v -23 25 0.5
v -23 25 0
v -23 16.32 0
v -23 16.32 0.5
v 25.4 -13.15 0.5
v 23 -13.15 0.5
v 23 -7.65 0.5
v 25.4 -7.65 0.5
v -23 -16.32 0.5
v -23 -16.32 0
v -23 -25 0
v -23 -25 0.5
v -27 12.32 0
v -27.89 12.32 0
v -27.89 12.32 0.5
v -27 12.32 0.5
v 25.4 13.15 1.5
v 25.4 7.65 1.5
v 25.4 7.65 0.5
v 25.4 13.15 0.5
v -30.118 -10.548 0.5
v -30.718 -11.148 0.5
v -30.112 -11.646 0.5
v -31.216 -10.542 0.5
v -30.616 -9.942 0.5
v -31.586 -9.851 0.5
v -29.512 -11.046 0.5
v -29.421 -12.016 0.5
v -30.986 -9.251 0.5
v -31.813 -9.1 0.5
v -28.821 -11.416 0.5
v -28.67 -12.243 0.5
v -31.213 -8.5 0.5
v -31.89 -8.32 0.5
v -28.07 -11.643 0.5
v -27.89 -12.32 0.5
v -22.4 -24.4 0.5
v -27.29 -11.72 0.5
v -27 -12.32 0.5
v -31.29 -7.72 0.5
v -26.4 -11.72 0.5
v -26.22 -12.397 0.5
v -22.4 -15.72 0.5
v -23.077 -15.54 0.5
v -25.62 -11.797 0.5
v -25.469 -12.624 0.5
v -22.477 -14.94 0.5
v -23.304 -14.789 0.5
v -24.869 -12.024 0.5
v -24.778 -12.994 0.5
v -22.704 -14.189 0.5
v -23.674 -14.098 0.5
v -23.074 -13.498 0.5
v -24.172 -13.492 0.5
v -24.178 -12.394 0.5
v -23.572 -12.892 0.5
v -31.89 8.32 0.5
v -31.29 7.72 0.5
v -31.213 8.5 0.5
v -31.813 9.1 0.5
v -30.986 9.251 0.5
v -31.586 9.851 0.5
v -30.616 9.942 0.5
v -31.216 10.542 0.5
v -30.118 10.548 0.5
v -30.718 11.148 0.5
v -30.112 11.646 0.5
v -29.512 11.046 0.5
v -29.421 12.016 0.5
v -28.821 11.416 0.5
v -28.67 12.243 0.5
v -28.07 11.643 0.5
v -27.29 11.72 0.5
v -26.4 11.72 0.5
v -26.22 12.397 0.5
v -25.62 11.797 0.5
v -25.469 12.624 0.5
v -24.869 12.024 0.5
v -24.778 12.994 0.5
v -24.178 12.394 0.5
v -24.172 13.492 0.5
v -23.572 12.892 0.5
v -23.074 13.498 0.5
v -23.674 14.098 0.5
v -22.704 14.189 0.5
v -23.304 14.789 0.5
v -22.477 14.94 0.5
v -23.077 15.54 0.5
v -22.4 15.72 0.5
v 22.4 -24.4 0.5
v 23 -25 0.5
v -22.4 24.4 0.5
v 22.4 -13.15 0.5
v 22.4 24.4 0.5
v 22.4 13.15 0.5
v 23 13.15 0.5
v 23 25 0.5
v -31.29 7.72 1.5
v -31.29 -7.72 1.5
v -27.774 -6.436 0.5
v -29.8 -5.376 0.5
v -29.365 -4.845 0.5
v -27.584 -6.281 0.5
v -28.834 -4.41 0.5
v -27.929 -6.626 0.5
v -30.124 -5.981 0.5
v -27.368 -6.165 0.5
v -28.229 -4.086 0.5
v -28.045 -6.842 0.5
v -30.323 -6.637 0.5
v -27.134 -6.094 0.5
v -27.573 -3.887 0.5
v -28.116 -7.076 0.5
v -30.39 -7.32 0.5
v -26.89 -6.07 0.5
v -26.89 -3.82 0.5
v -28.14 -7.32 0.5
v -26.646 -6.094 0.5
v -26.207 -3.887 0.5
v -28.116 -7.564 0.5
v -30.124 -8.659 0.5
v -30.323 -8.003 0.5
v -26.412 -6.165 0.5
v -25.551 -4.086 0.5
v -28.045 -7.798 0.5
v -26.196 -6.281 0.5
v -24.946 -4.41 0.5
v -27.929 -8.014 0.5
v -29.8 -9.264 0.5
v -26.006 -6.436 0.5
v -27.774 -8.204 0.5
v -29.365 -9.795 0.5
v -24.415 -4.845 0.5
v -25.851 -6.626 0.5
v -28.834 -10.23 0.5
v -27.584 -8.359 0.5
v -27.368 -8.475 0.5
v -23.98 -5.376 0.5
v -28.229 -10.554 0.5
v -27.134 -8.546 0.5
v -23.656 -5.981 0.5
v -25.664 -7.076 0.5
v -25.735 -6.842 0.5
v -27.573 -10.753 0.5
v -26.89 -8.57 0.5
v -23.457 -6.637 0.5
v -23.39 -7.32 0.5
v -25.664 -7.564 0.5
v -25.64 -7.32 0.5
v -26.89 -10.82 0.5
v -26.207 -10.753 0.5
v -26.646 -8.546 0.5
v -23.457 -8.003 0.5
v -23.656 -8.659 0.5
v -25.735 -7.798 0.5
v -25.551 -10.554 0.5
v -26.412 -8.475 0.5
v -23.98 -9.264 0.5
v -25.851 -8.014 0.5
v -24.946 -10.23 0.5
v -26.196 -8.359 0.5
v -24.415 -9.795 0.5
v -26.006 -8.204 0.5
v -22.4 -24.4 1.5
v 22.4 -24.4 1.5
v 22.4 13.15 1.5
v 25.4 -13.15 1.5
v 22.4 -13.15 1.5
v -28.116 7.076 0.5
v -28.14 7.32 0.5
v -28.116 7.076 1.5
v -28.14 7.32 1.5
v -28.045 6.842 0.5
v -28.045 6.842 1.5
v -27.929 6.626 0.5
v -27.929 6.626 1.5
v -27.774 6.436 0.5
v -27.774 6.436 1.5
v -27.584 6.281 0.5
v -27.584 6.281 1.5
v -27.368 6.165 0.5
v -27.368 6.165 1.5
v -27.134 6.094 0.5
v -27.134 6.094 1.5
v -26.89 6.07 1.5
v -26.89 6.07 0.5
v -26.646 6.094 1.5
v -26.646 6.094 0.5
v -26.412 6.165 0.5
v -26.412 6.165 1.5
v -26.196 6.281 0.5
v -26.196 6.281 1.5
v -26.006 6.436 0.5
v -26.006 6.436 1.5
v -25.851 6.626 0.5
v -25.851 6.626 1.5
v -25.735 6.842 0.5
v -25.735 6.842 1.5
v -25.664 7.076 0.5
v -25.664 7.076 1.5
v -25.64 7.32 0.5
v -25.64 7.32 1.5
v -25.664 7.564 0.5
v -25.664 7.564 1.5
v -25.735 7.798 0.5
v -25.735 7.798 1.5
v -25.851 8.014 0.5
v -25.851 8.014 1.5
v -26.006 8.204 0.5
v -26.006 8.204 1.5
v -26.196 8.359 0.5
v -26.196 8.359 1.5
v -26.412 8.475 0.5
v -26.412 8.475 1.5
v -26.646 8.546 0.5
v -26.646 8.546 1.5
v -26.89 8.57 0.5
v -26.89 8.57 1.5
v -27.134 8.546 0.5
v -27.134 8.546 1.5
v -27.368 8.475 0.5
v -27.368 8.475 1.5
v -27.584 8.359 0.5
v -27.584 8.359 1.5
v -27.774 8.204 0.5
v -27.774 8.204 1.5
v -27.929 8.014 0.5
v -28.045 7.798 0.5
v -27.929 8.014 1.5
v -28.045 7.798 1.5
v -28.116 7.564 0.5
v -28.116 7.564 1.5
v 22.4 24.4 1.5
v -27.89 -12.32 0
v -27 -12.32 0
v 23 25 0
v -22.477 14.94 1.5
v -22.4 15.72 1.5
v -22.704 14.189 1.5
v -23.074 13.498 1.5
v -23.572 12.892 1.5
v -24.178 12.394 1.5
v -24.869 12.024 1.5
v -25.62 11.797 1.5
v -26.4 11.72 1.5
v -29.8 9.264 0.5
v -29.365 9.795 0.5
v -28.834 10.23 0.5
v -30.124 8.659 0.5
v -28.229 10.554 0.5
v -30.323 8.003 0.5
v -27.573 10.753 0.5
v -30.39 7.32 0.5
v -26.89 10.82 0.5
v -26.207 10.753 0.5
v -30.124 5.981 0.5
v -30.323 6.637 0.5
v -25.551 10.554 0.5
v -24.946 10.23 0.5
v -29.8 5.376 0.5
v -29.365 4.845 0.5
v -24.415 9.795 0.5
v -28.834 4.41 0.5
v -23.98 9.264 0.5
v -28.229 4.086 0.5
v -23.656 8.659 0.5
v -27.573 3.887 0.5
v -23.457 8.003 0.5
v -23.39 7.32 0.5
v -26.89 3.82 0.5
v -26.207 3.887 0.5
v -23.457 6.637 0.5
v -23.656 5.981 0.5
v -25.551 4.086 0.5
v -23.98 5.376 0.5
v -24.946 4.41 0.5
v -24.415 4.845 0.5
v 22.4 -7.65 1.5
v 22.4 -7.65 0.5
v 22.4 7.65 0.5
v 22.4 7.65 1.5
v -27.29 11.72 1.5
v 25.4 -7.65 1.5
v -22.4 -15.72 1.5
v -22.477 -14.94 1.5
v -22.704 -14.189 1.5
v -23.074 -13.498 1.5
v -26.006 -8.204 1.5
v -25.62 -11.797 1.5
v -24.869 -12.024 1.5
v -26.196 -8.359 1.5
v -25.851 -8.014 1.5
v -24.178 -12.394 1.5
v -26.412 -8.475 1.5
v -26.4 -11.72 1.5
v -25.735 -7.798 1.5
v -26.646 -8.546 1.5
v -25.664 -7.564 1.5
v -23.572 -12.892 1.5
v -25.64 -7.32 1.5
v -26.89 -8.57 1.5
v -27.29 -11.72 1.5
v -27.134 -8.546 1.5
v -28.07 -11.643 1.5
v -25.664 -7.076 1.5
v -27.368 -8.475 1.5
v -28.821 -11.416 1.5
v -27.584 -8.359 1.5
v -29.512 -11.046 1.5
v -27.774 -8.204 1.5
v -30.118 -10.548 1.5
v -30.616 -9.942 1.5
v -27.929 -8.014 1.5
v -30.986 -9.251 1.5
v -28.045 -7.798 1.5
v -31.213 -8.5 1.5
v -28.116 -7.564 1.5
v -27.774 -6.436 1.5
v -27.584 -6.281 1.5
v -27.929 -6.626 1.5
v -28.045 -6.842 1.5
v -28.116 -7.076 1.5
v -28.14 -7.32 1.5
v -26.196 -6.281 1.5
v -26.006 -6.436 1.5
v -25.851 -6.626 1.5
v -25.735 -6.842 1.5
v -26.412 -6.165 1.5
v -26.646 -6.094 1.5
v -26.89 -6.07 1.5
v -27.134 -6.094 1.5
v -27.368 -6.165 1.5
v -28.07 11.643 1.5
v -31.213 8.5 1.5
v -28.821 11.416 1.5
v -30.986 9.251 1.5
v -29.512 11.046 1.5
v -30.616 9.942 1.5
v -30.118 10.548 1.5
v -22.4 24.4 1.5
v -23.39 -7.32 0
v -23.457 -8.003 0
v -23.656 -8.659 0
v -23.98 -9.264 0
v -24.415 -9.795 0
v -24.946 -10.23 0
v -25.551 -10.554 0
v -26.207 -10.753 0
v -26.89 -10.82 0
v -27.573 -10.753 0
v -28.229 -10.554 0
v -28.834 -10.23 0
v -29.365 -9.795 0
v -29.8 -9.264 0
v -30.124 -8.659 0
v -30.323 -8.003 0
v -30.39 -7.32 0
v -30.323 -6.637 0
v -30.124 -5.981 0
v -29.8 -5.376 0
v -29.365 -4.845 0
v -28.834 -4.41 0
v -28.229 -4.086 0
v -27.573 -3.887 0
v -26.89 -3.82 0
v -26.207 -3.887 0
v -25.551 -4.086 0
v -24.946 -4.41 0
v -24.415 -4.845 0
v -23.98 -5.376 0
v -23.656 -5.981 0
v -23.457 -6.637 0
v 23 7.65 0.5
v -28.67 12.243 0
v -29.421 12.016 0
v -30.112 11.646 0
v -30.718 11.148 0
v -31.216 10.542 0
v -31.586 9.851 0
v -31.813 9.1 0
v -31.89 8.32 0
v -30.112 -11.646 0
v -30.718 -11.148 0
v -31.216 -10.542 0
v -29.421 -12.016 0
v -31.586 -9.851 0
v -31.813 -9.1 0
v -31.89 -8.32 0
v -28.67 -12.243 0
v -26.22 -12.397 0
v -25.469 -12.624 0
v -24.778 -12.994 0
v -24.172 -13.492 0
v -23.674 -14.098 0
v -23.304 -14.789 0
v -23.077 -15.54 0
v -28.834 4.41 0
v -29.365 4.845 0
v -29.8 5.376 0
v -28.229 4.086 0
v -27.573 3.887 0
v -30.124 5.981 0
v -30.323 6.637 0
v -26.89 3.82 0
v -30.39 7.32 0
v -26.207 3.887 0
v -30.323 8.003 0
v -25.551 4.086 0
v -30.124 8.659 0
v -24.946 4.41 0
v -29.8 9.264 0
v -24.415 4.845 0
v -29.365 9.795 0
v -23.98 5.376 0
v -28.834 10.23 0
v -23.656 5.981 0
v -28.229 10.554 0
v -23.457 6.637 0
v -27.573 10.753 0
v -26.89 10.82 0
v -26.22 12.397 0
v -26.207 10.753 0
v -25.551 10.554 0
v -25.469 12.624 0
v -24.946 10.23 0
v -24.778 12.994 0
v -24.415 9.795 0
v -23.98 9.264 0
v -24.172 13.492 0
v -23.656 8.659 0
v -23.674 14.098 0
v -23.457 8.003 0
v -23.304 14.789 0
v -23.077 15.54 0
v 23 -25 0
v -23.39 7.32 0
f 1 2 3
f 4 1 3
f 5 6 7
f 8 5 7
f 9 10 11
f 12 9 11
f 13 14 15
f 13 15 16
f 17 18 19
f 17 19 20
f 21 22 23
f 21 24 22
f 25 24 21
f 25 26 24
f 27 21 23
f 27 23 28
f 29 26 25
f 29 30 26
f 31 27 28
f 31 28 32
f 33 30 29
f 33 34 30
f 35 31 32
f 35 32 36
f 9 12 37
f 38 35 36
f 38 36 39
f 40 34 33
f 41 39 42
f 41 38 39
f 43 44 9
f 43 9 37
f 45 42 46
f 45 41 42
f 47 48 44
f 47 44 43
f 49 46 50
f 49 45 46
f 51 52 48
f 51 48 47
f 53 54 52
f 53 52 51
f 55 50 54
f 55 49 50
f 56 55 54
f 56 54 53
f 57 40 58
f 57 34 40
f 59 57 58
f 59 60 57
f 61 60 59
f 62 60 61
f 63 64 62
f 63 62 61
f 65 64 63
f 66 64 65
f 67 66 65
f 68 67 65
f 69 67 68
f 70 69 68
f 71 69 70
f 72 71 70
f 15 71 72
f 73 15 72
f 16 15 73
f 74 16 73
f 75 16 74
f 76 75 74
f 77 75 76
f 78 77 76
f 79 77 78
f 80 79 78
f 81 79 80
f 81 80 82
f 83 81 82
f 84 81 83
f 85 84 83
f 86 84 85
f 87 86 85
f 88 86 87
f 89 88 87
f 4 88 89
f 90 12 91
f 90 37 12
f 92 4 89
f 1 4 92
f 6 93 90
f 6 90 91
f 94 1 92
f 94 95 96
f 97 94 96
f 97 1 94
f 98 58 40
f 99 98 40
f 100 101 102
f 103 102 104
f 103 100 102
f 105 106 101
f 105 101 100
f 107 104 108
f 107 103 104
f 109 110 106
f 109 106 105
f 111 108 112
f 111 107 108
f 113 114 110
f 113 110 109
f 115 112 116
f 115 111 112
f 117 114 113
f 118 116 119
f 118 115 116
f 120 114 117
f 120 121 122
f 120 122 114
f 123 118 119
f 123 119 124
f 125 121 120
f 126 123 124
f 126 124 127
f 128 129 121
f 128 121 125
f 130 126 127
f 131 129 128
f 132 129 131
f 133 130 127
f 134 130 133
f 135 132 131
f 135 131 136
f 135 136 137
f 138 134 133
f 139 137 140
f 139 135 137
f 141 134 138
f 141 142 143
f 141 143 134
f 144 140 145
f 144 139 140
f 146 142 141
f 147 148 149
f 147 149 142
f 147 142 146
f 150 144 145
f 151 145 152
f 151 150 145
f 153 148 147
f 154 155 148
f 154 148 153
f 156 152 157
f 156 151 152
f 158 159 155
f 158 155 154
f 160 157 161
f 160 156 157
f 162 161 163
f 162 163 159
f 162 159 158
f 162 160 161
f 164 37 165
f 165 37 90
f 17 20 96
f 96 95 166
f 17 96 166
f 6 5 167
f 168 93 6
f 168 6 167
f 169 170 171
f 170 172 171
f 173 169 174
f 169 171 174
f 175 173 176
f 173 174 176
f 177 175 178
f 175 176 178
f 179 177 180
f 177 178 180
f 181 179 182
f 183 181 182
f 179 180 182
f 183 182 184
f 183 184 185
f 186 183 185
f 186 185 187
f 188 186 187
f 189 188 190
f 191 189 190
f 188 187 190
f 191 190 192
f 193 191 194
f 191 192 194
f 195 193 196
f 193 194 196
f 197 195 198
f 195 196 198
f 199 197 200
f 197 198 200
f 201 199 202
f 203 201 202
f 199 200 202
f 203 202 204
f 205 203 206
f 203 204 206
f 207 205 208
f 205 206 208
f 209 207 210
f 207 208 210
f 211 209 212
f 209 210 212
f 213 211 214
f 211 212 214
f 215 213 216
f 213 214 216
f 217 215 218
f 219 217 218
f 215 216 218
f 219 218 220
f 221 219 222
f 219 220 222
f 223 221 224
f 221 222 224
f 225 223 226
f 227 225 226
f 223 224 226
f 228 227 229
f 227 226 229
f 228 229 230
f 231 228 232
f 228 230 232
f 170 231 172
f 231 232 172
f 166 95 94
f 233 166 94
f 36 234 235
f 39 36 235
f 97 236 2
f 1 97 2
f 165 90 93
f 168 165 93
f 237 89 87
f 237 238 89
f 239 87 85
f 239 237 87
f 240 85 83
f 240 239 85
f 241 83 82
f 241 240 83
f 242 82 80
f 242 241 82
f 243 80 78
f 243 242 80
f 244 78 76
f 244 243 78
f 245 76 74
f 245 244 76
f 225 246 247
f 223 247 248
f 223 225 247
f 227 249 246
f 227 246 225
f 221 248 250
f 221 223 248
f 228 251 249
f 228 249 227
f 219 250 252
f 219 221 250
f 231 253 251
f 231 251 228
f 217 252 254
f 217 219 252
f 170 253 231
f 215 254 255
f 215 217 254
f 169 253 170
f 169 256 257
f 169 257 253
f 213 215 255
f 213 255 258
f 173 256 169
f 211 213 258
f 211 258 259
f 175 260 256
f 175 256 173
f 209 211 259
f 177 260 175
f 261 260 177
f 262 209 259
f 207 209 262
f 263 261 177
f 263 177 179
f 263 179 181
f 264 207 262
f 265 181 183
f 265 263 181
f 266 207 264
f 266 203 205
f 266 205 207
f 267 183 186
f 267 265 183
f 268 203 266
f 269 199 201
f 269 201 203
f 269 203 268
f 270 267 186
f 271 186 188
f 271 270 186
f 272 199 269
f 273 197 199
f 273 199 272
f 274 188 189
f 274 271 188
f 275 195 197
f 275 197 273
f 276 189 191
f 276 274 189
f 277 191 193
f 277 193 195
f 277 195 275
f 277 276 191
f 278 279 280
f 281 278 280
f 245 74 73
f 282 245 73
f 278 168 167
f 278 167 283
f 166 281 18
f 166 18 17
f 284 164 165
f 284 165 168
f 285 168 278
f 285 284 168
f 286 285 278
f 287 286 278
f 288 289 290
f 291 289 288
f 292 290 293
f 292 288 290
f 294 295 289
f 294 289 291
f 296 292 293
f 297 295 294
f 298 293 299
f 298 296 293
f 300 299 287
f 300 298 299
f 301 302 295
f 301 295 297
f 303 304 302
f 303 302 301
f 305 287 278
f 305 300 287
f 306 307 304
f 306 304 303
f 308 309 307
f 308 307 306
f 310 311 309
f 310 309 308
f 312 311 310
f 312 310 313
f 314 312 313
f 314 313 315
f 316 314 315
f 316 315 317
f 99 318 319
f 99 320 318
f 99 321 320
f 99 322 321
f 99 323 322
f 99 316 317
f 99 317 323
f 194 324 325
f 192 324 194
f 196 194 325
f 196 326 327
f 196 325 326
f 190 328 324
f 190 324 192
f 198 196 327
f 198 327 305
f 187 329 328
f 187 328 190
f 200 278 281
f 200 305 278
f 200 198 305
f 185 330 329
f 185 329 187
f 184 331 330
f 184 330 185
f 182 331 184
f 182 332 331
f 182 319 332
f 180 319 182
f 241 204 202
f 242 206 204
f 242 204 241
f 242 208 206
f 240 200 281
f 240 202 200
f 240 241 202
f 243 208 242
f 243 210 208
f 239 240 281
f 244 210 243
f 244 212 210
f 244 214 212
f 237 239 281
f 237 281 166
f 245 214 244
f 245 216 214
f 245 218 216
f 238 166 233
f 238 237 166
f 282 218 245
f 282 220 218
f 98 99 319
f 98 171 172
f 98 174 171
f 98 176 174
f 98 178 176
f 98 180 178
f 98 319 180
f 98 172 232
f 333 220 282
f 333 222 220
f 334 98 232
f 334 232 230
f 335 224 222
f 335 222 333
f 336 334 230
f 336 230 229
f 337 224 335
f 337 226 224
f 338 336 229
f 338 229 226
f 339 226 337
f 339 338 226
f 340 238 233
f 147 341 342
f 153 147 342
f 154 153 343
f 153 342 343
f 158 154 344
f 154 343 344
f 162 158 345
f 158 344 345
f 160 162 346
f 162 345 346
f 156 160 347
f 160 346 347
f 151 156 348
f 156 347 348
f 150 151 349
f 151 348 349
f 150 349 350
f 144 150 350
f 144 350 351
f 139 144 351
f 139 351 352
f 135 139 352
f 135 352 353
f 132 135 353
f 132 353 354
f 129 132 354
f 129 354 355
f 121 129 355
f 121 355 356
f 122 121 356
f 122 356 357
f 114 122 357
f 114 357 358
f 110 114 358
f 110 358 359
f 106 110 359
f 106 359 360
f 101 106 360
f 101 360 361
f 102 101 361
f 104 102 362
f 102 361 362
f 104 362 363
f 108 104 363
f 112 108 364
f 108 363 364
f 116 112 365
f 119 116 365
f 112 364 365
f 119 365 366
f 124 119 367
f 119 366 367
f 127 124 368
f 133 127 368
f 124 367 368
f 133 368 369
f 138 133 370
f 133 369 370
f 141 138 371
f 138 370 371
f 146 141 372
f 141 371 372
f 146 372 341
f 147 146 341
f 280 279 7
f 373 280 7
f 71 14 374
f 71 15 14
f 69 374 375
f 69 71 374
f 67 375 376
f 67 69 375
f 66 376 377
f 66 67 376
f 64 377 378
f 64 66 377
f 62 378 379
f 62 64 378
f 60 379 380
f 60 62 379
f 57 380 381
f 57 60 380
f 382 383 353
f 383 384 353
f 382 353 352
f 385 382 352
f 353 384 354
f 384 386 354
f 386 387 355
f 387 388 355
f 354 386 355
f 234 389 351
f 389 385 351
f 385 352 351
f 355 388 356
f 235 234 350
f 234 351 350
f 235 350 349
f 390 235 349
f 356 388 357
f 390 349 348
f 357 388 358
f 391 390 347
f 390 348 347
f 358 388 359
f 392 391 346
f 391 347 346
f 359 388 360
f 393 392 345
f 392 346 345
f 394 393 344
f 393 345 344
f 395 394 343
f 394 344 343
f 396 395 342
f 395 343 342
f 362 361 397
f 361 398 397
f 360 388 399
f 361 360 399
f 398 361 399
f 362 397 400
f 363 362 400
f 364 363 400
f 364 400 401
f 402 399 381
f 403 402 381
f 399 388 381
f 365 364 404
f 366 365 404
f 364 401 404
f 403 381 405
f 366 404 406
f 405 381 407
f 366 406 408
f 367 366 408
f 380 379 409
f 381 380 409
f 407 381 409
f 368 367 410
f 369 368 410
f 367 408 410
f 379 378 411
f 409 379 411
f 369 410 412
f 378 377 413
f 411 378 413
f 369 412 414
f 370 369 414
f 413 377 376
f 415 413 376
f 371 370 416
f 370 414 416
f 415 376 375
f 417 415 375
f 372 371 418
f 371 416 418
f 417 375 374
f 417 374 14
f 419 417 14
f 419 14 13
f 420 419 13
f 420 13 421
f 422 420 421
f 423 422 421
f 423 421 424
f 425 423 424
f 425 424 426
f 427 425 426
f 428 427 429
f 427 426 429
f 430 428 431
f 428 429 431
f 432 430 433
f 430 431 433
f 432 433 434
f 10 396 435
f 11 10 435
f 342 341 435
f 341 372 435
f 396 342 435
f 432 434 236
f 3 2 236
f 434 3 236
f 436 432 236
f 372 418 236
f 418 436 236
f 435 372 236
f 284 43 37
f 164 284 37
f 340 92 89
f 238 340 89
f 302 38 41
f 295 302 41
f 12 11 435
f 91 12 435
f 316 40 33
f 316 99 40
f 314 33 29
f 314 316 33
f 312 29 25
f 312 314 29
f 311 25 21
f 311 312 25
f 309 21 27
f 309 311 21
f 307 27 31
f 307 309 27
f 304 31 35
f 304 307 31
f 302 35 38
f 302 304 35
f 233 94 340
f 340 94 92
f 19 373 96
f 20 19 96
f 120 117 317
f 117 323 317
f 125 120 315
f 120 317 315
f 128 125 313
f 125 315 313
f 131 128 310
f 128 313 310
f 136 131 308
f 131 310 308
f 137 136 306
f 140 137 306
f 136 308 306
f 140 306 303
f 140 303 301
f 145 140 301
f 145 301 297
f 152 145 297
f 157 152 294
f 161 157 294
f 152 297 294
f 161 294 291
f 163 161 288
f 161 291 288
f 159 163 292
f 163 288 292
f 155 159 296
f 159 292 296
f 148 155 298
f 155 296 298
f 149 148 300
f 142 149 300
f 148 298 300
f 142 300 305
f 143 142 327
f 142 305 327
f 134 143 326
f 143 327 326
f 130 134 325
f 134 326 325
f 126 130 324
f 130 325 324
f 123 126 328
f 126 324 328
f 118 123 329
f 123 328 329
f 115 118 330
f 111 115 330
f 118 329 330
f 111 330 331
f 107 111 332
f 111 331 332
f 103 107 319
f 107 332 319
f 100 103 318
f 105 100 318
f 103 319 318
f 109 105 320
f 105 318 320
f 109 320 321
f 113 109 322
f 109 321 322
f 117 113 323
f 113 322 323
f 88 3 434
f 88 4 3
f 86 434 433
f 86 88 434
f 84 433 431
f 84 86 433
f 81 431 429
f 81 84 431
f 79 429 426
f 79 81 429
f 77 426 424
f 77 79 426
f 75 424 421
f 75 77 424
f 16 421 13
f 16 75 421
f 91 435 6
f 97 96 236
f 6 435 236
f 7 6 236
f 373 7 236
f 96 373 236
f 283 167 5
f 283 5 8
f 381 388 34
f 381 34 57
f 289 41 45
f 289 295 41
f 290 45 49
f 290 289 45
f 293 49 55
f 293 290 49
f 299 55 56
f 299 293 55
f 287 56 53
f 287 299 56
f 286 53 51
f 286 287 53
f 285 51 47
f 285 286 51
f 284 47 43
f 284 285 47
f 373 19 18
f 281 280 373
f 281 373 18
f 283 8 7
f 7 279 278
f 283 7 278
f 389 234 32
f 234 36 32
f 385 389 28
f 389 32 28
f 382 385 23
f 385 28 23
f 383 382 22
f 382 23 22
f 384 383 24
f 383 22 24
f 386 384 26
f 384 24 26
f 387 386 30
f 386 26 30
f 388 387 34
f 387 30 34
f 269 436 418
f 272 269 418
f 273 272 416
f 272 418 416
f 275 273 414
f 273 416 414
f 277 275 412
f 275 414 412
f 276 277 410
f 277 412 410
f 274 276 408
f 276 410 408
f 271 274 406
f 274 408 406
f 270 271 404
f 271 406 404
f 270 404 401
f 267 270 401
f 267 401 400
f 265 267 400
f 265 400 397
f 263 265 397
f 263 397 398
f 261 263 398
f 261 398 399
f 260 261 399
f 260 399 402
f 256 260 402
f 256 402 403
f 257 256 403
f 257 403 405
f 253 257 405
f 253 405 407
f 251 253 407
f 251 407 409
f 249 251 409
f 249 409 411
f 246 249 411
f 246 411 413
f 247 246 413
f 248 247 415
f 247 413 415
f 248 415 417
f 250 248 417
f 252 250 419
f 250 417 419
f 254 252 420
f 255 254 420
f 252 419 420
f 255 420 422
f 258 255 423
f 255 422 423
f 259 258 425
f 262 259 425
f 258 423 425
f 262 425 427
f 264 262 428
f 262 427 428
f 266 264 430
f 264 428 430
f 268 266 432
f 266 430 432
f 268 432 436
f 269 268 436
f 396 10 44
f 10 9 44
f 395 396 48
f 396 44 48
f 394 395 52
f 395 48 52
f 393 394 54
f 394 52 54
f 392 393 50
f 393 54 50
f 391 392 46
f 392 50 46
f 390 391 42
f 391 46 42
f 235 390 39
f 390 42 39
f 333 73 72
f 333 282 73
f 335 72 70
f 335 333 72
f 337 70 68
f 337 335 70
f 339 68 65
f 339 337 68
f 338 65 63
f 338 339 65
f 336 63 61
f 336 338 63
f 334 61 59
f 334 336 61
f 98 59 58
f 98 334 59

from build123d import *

# Parameters (mm, degrees)
F0_W           = 8.89
F0_H           = 24.64
F1_DEPTH       = 0.5
F3_DEPTH       = 1
F4_R           = 4
F6_D           = 2.5
F6_CBORE_D     = 7
F6_CBORE_DEPTH = 0.5
F7_W           = 5.5
F7_H           = 1
F8_DEPTH       = 3


with BuildPart() as f1:
    # F0 (on Top) → F1 (new body)
    with BuildSketch(Plane.XY):
        Polygon((-23, -25), (23, -25), (23, 25), (-23, 25), (-23, 12.32), (-23, -12.32), align=None)
        with Locations((-27.445, 0)):
            Rectangle(F0_W, F0_H)
    extrude(amount=F1_DEPTH)

    # F2 (on face) → F3 (join)
    with BuildSketch(Plane.XY.offset(0.5)):
        Polygon((-22.4, -24.4), (22.4, -24.4), (22.4, 24.4), (-22.4, 24.4), (-22.4, 11.72), (-31.29, 11.72), (-31.29, -11.72), (-22.4, -11.72), align=None)
    extrude(amount=F3_DEPTH)

    # F4
    f4_edges = [f1.edges().sort_by_distance(p)[0] for p in [
        (-31.89, 12.32, 0.25),
        (-31.29, 11.72, 1),
        (-23, 12.32, 0.25),
        (-22.4, 11.72, 1),
        (-31.29, -11.72, 1),
        (-31.89, -12.32, 0.25),
        (-23, -12.32, 0.25),
        (-22.4, -11.72, 1),
    ]]
    fillet(f4_edges, radius=F4_R)

    # F6 (through all)
    with Locations(Plane(origin=(0, 0, 0), x_dir=(1, 0, 0), z_dir=(0, 0, -1))):
        with Locations((-26.89, -7.32), (-26.89, 7.32)):
            CounterBoreHole(F6_D / 2, F6_CBORE_D / 2, F6_CBORE_DEPTH)

    # F7 (on face) → F8 (join)
    with BuildSketch(Plane.YZ.offset(22.4)):
        with Locations((-10.4, 1)):
            Rectangle(F7_W, F7_H)
        with Locations((10.4, 1)):
            Rectangle(F7_W, F7_H)
    extrude(amount=F8_DEPTH)


solid = f1.part
